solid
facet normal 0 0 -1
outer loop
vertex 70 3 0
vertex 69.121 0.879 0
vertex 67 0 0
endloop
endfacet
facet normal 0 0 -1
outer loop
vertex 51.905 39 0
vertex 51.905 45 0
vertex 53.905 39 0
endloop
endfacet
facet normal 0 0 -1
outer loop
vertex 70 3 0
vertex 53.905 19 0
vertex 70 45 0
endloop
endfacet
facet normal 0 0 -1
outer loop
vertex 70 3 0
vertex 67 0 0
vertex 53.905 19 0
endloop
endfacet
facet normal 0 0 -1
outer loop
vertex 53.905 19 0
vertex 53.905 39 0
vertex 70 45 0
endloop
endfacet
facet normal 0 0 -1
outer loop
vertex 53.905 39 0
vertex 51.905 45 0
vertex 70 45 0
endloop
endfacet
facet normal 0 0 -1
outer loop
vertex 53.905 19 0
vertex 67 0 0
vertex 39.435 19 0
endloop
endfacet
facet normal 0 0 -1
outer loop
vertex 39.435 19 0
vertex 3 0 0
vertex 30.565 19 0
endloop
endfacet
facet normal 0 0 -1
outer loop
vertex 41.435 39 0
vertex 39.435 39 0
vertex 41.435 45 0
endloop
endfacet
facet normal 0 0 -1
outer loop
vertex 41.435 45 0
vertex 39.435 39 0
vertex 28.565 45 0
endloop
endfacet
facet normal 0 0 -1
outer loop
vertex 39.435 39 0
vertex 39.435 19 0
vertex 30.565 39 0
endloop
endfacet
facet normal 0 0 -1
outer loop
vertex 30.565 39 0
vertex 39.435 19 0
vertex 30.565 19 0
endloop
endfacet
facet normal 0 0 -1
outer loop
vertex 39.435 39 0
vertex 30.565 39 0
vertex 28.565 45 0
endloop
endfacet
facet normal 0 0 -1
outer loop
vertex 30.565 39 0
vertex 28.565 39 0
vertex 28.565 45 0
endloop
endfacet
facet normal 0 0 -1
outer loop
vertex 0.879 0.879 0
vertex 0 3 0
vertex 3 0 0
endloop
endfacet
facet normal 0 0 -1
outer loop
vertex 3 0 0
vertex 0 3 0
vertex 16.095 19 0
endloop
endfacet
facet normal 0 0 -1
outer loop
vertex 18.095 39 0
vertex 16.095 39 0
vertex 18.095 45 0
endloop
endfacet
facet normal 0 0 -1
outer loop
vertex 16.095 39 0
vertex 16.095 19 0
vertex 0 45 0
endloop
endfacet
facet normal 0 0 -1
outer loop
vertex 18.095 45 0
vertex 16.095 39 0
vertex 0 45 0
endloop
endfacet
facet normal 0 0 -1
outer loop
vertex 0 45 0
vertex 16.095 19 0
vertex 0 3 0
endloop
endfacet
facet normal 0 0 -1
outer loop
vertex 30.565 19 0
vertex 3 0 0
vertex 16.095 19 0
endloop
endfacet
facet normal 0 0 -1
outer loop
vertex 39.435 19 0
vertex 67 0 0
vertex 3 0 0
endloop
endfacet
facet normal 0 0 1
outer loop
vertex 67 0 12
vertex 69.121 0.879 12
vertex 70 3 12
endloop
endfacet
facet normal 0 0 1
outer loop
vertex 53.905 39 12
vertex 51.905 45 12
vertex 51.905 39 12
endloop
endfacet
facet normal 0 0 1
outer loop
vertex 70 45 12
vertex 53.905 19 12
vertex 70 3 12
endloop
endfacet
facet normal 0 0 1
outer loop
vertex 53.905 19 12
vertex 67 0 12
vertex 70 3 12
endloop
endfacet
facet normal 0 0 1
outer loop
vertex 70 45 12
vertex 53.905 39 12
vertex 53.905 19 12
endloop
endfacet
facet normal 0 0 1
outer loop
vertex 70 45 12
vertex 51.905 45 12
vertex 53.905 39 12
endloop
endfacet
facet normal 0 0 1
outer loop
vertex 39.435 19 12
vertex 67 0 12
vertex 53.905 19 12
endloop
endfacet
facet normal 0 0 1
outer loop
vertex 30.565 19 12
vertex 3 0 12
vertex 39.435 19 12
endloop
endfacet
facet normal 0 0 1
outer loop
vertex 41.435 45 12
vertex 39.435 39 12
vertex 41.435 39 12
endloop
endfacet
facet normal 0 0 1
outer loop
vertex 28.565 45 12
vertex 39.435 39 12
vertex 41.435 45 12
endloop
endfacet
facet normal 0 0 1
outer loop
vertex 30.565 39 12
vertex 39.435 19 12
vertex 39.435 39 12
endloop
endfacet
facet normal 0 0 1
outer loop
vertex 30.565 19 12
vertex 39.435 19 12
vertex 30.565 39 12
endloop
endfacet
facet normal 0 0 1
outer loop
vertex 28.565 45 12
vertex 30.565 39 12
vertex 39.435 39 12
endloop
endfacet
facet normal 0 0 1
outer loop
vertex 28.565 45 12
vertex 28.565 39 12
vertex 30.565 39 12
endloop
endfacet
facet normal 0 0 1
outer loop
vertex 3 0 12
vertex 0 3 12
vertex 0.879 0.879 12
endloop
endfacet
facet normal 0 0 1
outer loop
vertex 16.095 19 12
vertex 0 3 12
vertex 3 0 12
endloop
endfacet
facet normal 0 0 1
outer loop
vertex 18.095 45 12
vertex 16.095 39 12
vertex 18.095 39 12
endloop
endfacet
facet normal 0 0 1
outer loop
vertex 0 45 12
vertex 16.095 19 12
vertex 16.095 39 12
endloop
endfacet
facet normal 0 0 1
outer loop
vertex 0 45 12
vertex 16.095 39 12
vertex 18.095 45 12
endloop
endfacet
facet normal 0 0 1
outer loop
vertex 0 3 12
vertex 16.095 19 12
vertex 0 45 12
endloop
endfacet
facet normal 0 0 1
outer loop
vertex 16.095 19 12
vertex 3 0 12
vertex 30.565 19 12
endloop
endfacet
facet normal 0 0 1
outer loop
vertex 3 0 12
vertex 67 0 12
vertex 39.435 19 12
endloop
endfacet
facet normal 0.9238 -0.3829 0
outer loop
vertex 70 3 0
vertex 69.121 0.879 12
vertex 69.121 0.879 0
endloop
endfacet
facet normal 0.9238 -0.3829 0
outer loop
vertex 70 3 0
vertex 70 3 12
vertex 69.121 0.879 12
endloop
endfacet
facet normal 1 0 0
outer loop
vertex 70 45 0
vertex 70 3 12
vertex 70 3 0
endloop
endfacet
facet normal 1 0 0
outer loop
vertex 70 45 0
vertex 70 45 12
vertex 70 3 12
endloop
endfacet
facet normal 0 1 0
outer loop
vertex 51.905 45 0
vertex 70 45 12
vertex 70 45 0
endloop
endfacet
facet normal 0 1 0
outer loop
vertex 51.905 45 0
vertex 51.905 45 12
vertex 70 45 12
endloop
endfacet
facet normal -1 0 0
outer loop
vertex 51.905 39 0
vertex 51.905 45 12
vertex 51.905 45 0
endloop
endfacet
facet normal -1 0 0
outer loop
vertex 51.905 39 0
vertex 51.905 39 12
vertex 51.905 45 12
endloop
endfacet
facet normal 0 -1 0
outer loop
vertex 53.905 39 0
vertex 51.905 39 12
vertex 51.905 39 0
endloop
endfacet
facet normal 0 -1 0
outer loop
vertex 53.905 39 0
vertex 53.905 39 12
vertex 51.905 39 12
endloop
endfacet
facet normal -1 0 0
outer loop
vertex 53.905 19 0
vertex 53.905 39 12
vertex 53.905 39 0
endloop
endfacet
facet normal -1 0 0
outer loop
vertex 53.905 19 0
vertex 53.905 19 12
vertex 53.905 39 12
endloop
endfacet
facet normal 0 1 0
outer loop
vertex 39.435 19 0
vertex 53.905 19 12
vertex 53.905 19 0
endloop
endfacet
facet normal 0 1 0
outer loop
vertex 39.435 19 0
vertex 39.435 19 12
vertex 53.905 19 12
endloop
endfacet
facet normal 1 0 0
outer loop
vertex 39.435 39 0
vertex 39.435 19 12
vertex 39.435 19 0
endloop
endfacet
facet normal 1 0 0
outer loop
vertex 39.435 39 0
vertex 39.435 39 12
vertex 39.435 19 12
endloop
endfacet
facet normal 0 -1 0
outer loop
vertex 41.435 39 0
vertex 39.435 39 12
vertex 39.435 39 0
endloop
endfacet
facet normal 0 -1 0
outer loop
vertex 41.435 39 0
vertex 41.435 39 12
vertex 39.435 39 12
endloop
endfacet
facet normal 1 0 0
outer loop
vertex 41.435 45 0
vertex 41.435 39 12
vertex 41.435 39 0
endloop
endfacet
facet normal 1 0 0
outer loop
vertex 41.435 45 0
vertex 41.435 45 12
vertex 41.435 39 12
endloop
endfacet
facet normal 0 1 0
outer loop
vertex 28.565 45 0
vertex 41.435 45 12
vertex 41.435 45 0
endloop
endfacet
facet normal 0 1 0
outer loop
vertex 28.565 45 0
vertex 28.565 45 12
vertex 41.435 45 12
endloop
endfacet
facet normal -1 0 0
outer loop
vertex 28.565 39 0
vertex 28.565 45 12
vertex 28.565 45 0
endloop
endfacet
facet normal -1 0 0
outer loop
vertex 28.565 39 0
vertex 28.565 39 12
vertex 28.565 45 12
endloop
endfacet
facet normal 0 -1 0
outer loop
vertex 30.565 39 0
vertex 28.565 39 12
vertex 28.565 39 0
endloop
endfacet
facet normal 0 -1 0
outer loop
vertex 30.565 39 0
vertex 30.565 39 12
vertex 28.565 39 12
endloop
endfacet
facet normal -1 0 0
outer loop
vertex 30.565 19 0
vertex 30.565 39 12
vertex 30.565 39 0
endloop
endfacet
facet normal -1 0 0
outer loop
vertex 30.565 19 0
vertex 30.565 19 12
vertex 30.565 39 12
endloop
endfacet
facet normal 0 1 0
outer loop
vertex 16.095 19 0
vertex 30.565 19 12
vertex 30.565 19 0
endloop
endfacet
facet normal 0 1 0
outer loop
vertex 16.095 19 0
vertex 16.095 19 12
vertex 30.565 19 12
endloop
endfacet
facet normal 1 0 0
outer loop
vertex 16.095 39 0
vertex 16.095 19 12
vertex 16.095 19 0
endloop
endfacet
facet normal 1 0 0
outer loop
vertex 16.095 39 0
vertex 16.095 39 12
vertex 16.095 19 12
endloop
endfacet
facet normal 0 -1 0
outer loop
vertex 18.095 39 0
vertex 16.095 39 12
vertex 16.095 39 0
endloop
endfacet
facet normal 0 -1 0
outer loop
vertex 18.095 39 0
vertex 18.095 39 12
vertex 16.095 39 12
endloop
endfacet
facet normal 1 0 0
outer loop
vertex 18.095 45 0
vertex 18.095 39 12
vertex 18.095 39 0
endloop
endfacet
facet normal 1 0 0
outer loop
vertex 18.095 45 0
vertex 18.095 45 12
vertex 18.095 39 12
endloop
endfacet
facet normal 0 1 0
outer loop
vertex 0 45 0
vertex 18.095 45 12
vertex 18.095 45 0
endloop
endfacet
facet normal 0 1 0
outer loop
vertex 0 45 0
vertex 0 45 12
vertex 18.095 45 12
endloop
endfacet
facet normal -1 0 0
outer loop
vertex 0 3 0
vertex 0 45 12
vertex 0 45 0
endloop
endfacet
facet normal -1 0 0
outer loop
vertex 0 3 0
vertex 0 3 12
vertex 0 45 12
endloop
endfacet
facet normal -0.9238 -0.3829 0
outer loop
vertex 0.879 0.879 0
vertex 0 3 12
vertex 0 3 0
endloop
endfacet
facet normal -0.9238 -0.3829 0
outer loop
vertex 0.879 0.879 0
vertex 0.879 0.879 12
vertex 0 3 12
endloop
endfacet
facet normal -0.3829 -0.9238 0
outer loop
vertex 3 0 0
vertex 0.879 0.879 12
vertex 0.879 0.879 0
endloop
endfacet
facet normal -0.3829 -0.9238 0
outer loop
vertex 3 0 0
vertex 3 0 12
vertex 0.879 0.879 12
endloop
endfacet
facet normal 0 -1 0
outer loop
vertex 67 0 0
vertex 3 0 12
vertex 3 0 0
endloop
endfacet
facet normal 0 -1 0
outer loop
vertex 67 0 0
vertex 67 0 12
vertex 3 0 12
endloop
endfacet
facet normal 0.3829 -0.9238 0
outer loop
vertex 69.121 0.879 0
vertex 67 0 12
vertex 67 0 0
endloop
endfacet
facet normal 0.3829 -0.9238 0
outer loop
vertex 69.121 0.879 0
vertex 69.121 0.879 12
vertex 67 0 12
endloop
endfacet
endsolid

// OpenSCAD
$fn = 32;

// ----------------------------------------------------------------------
// Window plate: 70 x 45 mm, 2 open windows
// ----------------------------------------------------------------------

// --- parameters (mm) ---
profile_height = 12;      // extrusion height
profile_points = 24;      // points of the closed outline

profile = [[0, 3], [0.879, 0.879], [3, 0], [67, 0], [69.121, 0.879], [70, 3], [70, 45], [51.905, 45], [51.905, 39], [53.905, 39], [53.905, 19], [39.435, 19], [39.435, 39], [41.435, 39], [41.435, 45], [28.565, 45], [28.565, 39], [30.565, 39], [30.565, 19], [16.095, 19], [16.095, 39], [18.095, 39], [18.095, 45], [0, 45]];  // single closed polygon, 24 points, counter clockwise

// --- the one profile operation ---
linear_extrude(height = profile_height) polygon(points = profile);
